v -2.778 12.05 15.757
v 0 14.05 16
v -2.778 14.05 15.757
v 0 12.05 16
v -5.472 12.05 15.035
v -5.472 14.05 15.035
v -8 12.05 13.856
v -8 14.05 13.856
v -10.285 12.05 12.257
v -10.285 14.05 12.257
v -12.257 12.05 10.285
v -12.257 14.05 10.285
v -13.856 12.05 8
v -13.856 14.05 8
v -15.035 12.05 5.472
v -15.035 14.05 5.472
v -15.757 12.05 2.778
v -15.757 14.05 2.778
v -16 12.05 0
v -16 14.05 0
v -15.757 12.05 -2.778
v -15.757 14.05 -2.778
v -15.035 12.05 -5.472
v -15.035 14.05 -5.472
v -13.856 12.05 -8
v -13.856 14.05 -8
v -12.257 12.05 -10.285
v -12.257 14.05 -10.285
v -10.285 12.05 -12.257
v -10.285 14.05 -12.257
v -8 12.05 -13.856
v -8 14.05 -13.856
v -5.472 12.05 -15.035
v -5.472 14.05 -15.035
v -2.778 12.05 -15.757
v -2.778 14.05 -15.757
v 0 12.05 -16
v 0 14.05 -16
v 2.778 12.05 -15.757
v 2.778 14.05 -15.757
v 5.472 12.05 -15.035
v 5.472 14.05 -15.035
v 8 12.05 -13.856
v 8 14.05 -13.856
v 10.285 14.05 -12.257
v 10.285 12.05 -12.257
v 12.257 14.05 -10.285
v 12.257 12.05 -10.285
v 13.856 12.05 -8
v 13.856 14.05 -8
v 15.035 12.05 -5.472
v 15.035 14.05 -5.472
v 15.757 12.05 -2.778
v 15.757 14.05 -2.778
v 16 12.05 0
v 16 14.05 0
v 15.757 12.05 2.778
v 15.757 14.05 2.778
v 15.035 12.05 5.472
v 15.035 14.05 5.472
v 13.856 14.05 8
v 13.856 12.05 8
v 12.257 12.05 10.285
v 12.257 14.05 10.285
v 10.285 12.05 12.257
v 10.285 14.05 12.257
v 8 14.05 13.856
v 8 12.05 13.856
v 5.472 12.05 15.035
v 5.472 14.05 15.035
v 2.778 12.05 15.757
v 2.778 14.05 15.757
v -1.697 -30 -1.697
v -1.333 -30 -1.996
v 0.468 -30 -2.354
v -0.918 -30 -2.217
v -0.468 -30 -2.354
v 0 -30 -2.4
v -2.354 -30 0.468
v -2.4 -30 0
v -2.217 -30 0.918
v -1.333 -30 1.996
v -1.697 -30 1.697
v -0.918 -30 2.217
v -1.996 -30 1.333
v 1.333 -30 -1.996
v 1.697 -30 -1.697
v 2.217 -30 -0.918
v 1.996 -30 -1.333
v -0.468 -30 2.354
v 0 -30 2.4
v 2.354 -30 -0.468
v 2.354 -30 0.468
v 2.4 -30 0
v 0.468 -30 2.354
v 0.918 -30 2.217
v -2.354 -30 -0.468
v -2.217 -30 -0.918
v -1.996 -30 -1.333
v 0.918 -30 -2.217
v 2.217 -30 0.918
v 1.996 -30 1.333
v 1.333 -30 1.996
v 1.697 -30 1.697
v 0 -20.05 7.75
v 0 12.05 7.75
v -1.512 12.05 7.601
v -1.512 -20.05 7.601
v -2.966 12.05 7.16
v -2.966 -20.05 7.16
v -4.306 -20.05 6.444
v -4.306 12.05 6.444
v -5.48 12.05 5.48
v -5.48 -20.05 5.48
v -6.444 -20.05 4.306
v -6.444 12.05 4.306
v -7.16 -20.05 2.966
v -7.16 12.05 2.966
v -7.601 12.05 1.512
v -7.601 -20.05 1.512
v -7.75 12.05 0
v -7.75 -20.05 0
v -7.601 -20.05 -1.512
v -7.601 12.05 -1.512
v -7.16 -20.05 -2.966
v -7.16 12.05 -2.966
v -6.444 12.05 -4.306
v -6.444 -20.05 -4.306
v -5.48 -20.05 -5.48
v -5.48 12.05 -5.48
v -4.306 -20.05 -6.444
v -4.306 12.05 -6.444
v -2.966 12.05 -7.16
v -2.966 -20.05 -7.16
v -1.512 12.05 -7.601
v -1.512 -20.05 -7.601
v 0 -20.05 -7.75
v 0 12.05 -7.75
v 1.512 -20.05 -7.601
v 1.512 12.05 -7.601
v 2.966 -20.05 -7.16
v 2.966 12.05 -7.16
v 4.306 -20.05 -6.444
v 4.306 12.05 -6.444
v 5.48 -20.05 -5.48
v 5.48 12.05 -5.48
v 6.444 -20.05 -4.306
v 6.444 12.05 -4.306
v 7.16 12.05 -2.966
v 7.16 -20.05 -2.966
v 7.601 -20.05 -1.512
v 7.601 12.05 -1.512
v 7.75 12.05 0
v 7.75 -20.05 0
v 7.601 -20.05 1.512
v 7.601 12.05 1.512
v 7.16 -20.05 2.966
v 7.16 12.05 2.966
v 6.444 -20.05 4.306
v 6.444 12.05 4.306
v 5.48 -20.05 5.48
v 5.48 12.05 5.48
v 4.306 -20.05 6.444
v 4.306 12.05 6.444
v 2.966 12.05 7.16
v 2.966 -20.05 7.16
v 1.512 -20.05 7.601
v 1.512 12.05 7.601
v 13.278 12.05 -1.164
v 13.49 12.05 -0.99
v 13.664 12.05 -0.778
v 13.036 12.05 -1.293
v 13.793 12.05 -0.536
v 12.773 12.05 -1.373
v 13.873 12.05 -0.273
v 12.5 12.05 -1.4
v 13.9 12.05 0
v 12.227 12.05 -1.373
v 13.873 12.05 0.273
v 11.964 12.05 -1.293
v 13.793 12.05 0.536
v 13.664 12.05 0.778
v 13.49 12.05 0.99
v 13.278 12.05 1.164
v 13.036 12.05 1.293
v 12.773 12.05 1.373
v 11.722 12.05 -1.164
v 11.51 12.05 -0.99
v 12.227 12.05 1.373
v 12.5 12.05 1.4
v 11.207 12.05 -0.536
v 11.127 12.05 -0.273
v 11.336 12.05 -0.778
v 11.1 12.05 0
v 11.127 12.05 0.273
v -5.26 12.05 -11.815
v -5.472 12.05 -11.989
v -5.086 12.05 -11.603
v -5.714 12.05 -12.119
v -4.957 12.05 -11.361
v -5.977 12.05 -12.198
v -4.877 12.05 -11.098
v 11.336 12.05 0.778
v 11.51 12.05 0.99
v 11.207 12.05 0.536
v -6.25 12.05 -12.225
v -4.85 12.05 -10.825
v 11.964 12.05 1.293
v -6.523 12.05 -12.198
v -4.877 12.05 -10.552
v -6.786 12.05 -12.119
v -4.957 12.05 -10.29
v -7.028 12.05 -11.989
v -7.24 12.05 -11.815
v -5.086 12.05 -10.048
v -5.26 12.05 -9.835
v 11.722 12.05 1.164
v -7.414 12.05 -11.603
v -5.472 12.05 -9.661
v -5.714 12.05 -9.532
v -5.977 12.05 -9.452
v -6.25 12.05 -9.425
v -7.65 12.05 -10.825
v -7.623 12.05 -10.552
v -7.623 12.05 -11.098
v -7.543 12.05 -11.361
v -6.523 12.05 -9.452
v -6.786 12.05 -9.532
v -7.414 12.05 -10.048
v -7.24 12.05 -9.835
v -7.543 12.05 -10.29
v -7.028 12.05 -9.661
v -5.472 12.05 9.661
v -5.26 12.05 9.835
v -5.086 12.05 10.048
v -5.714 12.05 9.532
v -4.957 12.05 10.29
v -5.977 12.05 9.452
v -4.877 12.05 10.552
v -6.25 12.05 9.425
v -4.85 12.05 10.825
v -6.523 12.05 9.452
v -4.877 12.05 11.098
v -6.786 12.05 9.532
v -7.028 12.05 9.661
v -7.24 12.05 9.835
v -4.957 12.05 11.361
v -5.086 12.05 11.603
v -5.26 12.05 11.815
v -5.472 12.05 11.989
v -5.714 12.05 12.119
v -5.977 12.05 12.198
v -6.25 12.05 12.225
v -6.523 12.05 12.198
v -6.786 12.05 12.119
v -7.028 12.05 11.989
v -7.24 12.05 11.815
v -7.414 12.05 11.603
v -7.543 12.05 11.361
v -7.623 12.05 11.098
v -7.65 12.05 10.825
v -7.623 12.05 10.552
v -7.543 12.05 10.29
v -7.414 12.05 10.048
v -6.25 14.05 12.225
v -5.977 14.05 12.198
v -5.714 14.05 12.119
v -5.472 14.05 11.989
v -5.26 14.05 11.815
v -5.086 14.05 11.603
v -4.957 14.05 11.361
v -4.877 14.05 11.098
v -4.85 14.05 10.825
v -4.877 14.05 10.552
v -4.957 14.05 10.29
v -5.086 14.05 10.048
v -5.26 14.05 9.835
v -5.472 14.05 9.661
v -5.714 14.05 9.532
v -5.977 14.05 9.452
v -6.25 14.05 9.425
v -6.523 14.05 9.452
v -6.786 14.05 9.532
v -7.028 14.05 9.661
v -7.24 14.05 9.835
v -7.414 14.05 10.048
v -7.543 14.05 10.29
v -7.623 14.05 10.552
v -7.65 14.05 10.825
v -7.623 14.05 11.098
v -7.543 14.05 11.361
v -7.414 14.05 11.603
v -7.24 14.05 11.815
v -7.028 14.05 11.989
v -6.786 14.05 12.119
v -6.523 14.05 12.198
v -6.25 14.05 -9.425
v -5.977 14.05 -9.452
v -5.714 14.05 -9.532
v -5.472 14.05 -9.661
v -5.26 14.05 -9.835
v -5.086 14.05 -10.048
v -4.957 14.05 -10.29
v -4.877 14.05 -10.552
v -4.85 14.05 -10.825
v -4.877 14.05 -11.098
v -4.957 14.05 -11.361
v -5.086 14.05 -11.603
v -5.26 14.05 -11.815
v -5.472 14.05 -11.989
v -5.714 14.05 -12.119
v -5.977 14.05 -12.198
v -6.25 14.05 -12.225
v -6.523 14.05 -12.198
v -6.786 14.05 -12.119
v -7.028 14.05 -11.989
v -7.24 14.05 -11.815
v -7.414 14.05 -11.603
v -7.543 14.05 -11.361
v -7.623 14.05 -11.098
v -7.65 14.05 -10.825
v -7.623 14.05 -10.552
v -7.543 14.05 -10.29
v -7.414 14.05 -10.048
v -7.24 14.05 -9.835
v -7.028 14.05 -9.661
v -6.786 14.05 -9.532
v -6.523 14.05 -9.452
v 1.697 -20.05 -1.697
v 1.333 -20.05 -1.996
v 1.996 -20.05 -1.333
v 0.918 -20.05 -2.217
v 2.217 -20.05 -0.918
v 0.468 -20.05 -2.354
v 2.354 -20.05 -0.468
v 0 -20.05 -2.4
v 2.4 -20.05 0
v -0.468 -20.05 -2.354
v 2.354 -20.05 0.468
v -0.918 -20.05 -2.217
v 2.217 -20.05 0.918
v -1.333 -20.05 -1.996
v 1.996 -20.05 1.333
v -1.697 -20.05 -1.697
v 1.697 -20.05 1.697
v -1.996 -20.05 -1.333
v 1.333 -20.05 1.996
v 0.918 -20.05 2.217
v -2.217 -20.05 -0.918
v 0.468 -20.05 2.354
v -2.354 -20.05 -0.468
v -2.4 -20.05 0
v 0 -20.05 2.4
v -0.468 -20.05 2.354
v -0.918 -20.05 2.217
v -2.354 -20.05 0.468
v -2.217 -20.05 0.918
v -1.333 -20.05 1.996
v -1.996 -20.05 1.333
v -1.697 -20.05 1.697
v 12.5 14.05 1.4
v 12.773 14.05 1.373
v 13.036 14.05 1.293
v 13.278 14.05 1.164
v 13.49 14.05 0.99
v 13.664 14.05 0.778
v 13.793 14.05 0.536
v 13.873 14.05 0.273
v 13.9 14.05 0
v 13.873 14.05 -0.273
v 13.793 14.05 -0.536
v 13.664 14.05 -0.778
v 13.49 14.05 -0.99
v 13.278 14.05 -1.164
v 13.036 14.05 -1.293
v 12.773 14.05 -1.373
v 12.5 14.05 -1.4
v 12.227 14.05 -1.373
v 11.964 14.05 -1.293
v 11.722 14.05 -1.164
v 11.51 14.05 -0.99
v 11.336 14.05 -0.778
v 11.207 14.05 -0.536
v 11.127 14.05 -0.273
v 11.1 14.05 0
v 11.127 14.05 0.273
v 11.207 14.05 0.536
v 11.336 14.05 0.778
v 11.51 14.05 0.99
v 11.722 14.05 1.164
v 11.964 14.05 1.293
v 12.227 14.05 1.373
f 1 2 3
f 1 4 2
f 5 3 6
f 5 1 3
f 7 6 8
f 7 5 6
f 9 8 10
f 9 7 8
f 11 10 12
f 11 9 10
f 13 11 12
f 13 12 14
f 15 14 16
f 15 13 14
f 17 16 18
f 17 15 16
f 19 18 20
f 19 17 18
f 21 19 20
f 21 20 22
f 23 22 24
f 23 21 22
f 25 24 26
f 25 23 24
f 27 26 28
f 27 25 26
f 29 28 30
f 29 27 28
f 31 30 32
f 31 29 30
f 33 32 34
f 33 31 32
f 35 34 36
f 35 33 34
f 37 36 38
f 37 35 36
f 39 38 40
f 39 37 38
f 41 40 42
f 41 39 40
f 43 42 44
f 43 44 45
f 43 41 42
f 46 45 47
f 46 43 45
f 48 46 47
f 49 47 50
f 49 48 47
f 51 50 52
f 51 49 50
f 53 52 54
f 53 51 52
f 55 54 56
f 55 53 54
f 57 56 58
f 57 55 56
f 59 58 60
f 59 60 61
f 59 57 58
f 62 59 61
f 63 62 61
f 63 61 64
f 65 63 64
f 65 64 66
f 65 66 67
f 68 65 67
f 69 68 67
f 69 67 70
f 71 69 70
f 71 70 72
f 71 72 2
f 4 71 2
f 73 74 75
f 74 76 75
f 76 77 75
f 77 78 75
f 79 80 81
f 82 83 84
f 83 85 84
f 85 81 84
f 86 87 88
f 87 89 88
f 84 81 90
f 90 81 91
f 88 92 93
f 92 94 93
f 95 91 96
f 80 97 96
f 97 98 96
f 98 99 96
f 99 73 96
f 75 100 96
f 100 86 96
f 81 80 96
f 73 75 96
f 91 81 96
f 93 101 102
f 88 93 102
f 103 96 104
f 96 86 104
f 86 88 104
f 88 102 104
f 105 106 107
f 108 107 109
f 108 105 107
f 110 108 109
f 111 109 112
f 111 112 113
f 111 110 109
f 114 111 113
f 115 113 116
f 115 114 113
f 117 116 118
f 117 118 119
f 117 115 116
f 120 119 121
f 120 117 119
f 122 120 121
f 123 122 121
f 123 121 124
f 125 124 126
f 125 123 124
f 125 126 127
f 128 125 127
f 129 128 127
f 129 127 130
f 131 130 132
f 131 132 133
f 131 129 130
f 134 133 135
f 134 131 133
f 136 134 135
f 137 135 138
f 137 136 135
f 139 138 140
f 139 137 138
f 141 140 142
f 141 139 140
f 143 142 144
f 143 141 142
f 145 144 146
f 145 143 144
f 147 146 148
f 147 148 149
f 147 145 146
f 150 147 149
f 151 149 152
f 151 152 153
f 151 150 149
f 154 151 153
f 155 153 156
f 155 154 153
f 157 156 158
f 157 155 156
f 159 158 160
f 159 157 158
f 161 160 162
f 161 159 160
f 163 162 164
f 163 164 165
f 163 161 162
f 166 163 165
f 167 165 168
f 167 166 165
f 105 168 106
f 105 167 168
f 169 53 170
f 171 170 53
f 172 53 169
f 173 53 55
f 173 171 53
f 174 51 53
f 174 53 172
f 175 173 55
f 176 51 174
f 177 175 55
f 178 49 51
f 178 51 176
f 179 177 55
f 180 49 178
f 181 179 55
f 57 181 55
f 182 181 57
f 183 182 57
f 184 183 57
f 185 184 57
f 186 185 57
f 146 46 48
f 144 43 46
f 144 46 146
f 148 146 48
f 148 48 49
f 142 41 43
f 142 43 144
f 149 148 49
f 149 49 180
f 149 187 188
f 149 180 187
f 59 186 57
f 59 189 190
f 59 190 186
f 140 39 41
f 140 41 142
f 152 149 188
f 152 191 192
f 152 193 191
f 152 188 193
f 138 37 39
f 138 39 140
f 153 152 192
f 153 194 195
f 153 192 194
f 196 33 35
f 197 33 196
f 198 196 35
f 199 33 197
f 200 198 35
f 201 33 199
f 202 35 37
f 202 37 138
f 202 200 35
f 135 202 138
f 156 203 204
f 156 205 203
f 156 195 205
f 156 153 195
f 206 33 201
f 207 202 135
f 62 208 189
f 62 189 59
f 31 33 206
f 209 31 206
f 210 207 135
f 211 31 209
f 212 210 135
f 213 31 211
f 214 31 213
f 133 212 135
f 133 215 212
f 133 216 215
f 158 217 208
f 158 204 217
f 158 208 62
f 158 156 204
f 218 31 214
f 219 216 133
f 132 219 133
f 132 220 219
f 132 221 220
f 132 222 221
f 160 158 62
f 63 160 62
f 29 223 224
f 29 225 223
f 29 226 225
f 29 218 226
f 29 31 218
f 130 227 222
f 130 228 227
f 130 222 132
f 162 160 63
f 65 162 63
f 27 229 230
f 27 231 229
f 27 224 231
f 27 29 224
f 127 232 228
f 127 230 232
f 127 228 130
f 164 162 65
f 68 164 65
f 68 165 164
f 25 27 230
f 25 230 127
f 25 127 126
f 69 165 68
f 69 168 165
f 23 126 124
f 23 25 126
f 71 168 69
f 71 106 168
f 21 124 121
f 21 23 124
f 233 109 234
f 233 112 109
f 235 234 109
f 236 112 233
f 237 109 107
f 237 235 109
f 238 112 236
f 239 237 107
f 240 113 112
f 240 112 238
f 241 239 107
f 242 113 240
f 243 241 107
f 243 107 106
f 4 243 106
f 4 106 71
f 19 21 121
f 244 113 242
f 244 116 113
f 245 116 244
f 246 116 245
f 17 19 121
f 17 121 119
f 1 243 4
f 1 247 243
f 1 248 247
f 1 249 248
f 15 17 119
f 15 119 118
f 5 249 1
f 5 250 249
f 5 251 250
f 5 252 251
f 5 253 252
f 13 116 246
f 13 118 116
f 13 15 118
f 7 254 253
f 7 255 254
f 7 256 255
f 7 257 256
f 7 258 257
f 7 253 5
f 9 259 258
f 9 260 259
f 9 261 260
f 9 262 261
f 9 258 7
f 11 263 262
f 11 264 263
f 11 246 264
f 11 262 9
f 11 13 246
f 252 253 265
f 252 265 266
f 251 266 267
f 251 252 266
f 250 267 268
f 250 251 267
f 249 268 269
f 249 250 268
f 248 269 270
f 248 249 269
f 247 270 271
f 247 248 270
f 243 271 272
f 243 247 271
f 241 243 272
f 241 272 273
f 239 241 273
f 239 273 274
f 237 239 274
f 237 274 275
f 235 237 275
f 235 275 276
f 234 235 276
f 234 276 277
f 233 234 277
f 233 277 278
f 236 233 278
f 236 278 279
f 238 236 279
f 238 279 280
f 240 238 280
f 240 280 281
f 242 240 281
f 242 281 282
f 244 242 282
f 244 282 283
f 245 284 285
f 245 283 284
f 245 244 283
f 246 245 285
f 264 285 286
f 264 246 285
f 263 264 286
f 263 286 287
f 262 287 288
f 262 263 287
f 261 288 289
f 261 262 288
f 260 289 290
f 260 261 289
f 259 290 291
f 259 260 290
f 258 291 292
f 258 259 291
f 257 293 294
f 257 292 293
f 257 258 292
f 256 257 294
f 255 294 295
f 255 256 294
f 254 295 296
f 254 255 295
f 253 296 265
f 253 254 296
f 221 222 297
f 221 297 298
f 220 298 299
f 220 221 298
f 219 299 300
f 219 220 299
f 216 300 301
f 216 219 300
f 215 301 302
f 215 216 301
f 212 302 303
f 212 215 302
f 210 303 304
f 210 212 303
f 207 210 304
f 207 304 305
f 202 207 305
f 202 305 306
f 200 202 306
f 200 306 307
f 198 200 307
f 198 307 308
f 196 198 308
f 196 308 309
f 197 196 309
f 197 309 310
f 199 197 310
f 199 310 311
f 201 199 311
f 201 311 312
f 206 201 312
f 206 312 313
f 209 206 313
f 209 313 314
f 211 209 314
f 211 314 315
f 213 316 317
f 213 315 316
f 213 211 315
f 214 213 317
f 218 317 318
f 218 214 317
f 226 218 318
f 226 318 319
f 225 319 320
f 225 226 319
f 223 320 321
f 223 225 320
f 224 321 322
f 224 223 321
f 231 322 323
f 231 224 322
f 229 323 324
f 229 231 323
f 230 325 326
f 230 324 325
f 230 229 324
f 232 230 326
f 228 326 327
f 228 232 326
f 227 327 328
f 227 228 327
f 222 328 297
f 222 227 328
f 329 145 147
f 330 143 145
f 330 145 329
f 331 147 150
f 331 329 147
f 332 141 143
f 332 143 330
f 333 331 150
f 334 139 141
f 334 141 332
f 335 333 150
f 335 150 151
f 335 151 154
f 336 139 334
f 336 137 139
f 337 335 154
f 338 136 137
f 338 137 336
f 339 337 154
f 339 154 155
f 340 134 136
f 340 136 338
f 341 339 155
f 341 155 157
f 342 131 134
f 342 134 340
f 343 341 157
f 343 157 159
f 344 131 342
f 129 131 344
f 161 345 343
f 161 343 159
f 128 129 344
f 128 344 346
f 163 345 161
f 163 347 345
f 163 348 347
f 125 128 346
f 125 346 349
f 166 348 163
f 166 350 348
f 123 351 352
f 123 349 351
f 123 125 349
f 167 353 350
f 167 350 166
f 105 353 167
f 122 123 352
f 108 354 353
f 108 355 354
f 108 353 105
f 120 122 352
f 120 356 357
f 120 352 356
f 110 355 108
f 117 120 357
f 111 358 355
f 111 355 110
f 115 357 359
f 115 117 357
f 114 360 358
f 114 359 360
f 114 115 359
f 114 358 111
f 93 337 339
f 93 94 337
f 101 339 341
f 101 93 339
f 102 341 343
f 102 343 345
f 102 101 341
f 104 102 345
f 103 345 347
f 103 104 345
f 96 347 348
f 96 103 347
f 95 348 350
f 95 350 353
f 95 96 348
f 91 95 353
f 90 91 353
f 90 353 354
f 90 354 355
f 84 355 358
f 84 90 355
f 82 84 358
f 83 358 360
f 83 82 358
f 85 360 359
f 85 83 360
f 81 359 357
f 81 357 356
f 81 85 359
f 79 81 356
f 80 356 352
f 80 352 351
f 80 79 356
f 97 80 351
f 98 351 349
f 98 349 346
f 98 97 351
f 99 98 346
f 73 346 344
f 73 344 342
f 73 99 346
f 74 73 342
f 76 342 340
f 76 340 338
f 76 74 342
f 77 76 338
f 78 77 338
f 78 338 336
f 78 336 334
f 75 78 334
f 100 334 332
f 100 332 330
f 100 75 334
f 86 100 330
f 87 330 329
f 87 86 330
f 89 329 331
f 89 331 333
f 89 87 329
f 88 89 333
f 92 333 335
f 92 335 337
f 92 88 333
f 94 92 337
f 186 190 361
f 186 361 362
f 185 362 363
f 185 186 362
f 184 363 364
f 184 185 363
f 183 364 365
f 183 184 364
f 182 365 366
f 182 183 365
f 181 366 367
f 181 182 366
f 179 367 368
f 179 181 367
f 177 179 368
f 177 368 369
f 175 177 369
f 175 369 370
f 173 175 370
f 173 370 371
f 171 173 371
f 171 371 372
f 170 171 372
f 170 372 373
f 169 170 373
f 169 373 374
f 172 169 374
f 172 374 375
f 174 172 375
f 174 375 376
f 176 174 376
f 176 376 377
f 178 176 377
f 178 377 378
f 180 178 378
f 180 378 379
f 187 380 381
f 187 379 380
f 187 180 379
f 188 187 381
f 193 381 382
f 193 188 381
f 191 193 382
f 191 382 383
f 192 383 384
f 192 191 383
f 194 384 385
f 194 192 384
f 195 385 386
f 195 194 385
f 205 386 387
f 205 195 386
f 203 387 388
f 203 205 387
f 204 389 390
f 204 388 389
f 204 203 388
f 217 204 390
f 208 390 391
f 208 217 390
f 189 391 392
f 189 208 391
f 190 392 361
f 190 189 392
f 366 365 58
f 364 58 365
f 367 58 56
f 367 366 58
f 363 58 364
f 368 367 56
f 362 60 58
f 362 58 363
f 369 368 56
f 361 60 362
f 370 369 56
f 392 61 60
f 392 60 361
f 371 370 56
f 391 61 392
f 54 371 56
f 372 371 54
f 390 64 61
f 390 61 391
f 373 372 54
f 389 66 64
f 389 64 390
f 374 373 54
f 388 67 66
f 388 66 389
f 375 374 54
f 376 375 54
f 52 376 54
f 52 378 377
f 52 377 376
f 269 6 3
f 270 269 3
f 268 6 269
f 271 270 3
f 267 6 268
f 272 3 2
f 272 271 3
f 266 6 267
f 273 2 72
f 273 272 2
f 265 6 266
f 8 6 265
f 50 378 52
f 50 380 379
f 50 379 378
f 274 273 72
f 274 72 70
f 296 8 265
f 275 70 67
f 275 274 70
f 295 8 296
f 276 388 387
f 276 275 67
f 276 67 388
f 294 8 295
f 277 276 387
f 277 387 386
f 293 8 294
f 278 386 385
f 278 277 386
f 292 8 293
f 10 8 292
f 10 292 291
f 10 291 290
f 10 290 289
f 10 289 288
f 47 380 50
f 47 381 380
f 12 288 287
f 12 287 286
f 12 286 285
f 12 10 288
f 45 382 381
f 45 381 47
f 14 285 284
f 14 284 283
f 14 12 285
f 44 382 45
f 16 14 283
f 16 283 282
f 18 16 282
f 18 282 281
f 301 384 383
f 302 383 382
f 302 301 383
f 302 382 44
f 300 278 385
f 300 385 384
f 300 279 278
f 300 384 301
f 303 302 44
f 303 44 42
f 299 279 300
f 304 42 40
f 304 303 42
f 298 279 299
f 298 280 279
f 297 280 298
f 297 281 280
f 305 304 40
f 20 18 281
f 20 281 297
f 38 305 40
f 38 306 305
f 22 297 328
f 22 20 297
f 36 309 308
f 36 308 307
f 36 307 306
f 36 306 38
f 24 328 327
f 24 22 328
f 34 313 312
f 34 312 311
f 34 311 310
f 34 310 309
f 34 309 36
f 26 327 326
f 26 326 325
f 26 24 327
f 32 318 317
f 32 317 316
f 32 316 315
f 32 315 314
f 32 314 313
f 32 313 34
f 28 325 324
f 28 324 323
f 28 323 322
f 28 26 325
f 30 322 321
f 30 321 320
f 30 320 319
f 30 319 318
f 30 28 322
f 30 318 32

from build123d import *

# Parameters (mm, degrees)
CUT_EXTRUDE1_DEPTH      = 41.924442574
CUT_EXTRUDE1_DEPTH_BACK = 41.924442574
SKETCH2_R               = 1.4
SKETCH4_R               = 2.4


with BuildPart() as part:
    # Sketch1 → Revolve1 (revolve)
    with BuildSketch(Plane(origin=(0, 0, 0), x_dir=(0, 0, -1), z_dir=(1, 0, 0))):
        Polygon((0, 20.05), (2.95, 20.05), (2.95, 14.05), (16, 14.05), (16, 12.05), (7.75, 12.05), (7.75, -20.05), (0, -20.05), align=None)
    revolve(axis=Axis((0, 23.931122449, 0), (0, -1, 0)))

    # Sketch2 → Cut-Extrude1 (cut, two sides: drawn at the far end of the back side and taken through both)
    with BuildSketch(Plane(origin=(0, 14.05, 0), x_dir=(1, 0, 0), z_dir=(0, 1, 0)).offset(-CUT_EXTRUDE1_DEPTH_BACK)):
        with Locations((12.5, 0)):
            Circle(SKETCH2_R)
        with Locations((-6.25, -10.825317547)):
            Circle(SKETCH2_R)
        with Locations((-6.25, 10.825317547)):
            Circle(SKETCH2_R)
    extrude(amount=CUT_EXTRUDE1_DEPTH + CUT_EXTRUDE1_DEPTH_BACK, mode=Mode.SUBTRACT)

    # Sweep1: sweep along a path in Sketch5
    with BuildLine(Plane(origin=(0, 0, 0), x_dir=(0, 0, -1), z_dir=(1, 0, 0))) as sweep1_path:
        Line((30, 52.05), (30, 32.05))
        ThreePointArc((30, 32.05), (28.242640687, 27.807359313), (24, 26.05))
        Line((24, 26.05), (6, 26.05))
        ThreePointArc((6, 26.05), (1.757359313, 24.292640687), (0, 20.05))
        Line((0, 20.05), (0, 0))
        Line((0, 0), (0, -30))
    # Sketch4 → Sweep1 (sweep)
    with BuildSketch(Plane(origin=(0, 0, 0), x_dir=(1, 0, 0), z_dir=(0, 1, 0))):
        Circle(SKETCH4_R)
    sweep(path=sweep1_path.line)


with BuildPart() as body_2:
    # Split2: the piece on the far side of the plane
    add(part.part)
    split(bisect_by=Plane(origin=(0, 14.05, -2.95), x_dir=(0, 0, -1), z_dir=(0, -1, 0)), keep=Keep.BOTTOM)


with BuildPart() as part_1:
    add(part.part)

    # Split2
    split(bisect_by=Plane(origin=(0, 14.05, -2.95), x_dir=(0, 0, -1), z_dir=(0, -1, 0)), keep=Keep.TOP)


solid = part_1.part
